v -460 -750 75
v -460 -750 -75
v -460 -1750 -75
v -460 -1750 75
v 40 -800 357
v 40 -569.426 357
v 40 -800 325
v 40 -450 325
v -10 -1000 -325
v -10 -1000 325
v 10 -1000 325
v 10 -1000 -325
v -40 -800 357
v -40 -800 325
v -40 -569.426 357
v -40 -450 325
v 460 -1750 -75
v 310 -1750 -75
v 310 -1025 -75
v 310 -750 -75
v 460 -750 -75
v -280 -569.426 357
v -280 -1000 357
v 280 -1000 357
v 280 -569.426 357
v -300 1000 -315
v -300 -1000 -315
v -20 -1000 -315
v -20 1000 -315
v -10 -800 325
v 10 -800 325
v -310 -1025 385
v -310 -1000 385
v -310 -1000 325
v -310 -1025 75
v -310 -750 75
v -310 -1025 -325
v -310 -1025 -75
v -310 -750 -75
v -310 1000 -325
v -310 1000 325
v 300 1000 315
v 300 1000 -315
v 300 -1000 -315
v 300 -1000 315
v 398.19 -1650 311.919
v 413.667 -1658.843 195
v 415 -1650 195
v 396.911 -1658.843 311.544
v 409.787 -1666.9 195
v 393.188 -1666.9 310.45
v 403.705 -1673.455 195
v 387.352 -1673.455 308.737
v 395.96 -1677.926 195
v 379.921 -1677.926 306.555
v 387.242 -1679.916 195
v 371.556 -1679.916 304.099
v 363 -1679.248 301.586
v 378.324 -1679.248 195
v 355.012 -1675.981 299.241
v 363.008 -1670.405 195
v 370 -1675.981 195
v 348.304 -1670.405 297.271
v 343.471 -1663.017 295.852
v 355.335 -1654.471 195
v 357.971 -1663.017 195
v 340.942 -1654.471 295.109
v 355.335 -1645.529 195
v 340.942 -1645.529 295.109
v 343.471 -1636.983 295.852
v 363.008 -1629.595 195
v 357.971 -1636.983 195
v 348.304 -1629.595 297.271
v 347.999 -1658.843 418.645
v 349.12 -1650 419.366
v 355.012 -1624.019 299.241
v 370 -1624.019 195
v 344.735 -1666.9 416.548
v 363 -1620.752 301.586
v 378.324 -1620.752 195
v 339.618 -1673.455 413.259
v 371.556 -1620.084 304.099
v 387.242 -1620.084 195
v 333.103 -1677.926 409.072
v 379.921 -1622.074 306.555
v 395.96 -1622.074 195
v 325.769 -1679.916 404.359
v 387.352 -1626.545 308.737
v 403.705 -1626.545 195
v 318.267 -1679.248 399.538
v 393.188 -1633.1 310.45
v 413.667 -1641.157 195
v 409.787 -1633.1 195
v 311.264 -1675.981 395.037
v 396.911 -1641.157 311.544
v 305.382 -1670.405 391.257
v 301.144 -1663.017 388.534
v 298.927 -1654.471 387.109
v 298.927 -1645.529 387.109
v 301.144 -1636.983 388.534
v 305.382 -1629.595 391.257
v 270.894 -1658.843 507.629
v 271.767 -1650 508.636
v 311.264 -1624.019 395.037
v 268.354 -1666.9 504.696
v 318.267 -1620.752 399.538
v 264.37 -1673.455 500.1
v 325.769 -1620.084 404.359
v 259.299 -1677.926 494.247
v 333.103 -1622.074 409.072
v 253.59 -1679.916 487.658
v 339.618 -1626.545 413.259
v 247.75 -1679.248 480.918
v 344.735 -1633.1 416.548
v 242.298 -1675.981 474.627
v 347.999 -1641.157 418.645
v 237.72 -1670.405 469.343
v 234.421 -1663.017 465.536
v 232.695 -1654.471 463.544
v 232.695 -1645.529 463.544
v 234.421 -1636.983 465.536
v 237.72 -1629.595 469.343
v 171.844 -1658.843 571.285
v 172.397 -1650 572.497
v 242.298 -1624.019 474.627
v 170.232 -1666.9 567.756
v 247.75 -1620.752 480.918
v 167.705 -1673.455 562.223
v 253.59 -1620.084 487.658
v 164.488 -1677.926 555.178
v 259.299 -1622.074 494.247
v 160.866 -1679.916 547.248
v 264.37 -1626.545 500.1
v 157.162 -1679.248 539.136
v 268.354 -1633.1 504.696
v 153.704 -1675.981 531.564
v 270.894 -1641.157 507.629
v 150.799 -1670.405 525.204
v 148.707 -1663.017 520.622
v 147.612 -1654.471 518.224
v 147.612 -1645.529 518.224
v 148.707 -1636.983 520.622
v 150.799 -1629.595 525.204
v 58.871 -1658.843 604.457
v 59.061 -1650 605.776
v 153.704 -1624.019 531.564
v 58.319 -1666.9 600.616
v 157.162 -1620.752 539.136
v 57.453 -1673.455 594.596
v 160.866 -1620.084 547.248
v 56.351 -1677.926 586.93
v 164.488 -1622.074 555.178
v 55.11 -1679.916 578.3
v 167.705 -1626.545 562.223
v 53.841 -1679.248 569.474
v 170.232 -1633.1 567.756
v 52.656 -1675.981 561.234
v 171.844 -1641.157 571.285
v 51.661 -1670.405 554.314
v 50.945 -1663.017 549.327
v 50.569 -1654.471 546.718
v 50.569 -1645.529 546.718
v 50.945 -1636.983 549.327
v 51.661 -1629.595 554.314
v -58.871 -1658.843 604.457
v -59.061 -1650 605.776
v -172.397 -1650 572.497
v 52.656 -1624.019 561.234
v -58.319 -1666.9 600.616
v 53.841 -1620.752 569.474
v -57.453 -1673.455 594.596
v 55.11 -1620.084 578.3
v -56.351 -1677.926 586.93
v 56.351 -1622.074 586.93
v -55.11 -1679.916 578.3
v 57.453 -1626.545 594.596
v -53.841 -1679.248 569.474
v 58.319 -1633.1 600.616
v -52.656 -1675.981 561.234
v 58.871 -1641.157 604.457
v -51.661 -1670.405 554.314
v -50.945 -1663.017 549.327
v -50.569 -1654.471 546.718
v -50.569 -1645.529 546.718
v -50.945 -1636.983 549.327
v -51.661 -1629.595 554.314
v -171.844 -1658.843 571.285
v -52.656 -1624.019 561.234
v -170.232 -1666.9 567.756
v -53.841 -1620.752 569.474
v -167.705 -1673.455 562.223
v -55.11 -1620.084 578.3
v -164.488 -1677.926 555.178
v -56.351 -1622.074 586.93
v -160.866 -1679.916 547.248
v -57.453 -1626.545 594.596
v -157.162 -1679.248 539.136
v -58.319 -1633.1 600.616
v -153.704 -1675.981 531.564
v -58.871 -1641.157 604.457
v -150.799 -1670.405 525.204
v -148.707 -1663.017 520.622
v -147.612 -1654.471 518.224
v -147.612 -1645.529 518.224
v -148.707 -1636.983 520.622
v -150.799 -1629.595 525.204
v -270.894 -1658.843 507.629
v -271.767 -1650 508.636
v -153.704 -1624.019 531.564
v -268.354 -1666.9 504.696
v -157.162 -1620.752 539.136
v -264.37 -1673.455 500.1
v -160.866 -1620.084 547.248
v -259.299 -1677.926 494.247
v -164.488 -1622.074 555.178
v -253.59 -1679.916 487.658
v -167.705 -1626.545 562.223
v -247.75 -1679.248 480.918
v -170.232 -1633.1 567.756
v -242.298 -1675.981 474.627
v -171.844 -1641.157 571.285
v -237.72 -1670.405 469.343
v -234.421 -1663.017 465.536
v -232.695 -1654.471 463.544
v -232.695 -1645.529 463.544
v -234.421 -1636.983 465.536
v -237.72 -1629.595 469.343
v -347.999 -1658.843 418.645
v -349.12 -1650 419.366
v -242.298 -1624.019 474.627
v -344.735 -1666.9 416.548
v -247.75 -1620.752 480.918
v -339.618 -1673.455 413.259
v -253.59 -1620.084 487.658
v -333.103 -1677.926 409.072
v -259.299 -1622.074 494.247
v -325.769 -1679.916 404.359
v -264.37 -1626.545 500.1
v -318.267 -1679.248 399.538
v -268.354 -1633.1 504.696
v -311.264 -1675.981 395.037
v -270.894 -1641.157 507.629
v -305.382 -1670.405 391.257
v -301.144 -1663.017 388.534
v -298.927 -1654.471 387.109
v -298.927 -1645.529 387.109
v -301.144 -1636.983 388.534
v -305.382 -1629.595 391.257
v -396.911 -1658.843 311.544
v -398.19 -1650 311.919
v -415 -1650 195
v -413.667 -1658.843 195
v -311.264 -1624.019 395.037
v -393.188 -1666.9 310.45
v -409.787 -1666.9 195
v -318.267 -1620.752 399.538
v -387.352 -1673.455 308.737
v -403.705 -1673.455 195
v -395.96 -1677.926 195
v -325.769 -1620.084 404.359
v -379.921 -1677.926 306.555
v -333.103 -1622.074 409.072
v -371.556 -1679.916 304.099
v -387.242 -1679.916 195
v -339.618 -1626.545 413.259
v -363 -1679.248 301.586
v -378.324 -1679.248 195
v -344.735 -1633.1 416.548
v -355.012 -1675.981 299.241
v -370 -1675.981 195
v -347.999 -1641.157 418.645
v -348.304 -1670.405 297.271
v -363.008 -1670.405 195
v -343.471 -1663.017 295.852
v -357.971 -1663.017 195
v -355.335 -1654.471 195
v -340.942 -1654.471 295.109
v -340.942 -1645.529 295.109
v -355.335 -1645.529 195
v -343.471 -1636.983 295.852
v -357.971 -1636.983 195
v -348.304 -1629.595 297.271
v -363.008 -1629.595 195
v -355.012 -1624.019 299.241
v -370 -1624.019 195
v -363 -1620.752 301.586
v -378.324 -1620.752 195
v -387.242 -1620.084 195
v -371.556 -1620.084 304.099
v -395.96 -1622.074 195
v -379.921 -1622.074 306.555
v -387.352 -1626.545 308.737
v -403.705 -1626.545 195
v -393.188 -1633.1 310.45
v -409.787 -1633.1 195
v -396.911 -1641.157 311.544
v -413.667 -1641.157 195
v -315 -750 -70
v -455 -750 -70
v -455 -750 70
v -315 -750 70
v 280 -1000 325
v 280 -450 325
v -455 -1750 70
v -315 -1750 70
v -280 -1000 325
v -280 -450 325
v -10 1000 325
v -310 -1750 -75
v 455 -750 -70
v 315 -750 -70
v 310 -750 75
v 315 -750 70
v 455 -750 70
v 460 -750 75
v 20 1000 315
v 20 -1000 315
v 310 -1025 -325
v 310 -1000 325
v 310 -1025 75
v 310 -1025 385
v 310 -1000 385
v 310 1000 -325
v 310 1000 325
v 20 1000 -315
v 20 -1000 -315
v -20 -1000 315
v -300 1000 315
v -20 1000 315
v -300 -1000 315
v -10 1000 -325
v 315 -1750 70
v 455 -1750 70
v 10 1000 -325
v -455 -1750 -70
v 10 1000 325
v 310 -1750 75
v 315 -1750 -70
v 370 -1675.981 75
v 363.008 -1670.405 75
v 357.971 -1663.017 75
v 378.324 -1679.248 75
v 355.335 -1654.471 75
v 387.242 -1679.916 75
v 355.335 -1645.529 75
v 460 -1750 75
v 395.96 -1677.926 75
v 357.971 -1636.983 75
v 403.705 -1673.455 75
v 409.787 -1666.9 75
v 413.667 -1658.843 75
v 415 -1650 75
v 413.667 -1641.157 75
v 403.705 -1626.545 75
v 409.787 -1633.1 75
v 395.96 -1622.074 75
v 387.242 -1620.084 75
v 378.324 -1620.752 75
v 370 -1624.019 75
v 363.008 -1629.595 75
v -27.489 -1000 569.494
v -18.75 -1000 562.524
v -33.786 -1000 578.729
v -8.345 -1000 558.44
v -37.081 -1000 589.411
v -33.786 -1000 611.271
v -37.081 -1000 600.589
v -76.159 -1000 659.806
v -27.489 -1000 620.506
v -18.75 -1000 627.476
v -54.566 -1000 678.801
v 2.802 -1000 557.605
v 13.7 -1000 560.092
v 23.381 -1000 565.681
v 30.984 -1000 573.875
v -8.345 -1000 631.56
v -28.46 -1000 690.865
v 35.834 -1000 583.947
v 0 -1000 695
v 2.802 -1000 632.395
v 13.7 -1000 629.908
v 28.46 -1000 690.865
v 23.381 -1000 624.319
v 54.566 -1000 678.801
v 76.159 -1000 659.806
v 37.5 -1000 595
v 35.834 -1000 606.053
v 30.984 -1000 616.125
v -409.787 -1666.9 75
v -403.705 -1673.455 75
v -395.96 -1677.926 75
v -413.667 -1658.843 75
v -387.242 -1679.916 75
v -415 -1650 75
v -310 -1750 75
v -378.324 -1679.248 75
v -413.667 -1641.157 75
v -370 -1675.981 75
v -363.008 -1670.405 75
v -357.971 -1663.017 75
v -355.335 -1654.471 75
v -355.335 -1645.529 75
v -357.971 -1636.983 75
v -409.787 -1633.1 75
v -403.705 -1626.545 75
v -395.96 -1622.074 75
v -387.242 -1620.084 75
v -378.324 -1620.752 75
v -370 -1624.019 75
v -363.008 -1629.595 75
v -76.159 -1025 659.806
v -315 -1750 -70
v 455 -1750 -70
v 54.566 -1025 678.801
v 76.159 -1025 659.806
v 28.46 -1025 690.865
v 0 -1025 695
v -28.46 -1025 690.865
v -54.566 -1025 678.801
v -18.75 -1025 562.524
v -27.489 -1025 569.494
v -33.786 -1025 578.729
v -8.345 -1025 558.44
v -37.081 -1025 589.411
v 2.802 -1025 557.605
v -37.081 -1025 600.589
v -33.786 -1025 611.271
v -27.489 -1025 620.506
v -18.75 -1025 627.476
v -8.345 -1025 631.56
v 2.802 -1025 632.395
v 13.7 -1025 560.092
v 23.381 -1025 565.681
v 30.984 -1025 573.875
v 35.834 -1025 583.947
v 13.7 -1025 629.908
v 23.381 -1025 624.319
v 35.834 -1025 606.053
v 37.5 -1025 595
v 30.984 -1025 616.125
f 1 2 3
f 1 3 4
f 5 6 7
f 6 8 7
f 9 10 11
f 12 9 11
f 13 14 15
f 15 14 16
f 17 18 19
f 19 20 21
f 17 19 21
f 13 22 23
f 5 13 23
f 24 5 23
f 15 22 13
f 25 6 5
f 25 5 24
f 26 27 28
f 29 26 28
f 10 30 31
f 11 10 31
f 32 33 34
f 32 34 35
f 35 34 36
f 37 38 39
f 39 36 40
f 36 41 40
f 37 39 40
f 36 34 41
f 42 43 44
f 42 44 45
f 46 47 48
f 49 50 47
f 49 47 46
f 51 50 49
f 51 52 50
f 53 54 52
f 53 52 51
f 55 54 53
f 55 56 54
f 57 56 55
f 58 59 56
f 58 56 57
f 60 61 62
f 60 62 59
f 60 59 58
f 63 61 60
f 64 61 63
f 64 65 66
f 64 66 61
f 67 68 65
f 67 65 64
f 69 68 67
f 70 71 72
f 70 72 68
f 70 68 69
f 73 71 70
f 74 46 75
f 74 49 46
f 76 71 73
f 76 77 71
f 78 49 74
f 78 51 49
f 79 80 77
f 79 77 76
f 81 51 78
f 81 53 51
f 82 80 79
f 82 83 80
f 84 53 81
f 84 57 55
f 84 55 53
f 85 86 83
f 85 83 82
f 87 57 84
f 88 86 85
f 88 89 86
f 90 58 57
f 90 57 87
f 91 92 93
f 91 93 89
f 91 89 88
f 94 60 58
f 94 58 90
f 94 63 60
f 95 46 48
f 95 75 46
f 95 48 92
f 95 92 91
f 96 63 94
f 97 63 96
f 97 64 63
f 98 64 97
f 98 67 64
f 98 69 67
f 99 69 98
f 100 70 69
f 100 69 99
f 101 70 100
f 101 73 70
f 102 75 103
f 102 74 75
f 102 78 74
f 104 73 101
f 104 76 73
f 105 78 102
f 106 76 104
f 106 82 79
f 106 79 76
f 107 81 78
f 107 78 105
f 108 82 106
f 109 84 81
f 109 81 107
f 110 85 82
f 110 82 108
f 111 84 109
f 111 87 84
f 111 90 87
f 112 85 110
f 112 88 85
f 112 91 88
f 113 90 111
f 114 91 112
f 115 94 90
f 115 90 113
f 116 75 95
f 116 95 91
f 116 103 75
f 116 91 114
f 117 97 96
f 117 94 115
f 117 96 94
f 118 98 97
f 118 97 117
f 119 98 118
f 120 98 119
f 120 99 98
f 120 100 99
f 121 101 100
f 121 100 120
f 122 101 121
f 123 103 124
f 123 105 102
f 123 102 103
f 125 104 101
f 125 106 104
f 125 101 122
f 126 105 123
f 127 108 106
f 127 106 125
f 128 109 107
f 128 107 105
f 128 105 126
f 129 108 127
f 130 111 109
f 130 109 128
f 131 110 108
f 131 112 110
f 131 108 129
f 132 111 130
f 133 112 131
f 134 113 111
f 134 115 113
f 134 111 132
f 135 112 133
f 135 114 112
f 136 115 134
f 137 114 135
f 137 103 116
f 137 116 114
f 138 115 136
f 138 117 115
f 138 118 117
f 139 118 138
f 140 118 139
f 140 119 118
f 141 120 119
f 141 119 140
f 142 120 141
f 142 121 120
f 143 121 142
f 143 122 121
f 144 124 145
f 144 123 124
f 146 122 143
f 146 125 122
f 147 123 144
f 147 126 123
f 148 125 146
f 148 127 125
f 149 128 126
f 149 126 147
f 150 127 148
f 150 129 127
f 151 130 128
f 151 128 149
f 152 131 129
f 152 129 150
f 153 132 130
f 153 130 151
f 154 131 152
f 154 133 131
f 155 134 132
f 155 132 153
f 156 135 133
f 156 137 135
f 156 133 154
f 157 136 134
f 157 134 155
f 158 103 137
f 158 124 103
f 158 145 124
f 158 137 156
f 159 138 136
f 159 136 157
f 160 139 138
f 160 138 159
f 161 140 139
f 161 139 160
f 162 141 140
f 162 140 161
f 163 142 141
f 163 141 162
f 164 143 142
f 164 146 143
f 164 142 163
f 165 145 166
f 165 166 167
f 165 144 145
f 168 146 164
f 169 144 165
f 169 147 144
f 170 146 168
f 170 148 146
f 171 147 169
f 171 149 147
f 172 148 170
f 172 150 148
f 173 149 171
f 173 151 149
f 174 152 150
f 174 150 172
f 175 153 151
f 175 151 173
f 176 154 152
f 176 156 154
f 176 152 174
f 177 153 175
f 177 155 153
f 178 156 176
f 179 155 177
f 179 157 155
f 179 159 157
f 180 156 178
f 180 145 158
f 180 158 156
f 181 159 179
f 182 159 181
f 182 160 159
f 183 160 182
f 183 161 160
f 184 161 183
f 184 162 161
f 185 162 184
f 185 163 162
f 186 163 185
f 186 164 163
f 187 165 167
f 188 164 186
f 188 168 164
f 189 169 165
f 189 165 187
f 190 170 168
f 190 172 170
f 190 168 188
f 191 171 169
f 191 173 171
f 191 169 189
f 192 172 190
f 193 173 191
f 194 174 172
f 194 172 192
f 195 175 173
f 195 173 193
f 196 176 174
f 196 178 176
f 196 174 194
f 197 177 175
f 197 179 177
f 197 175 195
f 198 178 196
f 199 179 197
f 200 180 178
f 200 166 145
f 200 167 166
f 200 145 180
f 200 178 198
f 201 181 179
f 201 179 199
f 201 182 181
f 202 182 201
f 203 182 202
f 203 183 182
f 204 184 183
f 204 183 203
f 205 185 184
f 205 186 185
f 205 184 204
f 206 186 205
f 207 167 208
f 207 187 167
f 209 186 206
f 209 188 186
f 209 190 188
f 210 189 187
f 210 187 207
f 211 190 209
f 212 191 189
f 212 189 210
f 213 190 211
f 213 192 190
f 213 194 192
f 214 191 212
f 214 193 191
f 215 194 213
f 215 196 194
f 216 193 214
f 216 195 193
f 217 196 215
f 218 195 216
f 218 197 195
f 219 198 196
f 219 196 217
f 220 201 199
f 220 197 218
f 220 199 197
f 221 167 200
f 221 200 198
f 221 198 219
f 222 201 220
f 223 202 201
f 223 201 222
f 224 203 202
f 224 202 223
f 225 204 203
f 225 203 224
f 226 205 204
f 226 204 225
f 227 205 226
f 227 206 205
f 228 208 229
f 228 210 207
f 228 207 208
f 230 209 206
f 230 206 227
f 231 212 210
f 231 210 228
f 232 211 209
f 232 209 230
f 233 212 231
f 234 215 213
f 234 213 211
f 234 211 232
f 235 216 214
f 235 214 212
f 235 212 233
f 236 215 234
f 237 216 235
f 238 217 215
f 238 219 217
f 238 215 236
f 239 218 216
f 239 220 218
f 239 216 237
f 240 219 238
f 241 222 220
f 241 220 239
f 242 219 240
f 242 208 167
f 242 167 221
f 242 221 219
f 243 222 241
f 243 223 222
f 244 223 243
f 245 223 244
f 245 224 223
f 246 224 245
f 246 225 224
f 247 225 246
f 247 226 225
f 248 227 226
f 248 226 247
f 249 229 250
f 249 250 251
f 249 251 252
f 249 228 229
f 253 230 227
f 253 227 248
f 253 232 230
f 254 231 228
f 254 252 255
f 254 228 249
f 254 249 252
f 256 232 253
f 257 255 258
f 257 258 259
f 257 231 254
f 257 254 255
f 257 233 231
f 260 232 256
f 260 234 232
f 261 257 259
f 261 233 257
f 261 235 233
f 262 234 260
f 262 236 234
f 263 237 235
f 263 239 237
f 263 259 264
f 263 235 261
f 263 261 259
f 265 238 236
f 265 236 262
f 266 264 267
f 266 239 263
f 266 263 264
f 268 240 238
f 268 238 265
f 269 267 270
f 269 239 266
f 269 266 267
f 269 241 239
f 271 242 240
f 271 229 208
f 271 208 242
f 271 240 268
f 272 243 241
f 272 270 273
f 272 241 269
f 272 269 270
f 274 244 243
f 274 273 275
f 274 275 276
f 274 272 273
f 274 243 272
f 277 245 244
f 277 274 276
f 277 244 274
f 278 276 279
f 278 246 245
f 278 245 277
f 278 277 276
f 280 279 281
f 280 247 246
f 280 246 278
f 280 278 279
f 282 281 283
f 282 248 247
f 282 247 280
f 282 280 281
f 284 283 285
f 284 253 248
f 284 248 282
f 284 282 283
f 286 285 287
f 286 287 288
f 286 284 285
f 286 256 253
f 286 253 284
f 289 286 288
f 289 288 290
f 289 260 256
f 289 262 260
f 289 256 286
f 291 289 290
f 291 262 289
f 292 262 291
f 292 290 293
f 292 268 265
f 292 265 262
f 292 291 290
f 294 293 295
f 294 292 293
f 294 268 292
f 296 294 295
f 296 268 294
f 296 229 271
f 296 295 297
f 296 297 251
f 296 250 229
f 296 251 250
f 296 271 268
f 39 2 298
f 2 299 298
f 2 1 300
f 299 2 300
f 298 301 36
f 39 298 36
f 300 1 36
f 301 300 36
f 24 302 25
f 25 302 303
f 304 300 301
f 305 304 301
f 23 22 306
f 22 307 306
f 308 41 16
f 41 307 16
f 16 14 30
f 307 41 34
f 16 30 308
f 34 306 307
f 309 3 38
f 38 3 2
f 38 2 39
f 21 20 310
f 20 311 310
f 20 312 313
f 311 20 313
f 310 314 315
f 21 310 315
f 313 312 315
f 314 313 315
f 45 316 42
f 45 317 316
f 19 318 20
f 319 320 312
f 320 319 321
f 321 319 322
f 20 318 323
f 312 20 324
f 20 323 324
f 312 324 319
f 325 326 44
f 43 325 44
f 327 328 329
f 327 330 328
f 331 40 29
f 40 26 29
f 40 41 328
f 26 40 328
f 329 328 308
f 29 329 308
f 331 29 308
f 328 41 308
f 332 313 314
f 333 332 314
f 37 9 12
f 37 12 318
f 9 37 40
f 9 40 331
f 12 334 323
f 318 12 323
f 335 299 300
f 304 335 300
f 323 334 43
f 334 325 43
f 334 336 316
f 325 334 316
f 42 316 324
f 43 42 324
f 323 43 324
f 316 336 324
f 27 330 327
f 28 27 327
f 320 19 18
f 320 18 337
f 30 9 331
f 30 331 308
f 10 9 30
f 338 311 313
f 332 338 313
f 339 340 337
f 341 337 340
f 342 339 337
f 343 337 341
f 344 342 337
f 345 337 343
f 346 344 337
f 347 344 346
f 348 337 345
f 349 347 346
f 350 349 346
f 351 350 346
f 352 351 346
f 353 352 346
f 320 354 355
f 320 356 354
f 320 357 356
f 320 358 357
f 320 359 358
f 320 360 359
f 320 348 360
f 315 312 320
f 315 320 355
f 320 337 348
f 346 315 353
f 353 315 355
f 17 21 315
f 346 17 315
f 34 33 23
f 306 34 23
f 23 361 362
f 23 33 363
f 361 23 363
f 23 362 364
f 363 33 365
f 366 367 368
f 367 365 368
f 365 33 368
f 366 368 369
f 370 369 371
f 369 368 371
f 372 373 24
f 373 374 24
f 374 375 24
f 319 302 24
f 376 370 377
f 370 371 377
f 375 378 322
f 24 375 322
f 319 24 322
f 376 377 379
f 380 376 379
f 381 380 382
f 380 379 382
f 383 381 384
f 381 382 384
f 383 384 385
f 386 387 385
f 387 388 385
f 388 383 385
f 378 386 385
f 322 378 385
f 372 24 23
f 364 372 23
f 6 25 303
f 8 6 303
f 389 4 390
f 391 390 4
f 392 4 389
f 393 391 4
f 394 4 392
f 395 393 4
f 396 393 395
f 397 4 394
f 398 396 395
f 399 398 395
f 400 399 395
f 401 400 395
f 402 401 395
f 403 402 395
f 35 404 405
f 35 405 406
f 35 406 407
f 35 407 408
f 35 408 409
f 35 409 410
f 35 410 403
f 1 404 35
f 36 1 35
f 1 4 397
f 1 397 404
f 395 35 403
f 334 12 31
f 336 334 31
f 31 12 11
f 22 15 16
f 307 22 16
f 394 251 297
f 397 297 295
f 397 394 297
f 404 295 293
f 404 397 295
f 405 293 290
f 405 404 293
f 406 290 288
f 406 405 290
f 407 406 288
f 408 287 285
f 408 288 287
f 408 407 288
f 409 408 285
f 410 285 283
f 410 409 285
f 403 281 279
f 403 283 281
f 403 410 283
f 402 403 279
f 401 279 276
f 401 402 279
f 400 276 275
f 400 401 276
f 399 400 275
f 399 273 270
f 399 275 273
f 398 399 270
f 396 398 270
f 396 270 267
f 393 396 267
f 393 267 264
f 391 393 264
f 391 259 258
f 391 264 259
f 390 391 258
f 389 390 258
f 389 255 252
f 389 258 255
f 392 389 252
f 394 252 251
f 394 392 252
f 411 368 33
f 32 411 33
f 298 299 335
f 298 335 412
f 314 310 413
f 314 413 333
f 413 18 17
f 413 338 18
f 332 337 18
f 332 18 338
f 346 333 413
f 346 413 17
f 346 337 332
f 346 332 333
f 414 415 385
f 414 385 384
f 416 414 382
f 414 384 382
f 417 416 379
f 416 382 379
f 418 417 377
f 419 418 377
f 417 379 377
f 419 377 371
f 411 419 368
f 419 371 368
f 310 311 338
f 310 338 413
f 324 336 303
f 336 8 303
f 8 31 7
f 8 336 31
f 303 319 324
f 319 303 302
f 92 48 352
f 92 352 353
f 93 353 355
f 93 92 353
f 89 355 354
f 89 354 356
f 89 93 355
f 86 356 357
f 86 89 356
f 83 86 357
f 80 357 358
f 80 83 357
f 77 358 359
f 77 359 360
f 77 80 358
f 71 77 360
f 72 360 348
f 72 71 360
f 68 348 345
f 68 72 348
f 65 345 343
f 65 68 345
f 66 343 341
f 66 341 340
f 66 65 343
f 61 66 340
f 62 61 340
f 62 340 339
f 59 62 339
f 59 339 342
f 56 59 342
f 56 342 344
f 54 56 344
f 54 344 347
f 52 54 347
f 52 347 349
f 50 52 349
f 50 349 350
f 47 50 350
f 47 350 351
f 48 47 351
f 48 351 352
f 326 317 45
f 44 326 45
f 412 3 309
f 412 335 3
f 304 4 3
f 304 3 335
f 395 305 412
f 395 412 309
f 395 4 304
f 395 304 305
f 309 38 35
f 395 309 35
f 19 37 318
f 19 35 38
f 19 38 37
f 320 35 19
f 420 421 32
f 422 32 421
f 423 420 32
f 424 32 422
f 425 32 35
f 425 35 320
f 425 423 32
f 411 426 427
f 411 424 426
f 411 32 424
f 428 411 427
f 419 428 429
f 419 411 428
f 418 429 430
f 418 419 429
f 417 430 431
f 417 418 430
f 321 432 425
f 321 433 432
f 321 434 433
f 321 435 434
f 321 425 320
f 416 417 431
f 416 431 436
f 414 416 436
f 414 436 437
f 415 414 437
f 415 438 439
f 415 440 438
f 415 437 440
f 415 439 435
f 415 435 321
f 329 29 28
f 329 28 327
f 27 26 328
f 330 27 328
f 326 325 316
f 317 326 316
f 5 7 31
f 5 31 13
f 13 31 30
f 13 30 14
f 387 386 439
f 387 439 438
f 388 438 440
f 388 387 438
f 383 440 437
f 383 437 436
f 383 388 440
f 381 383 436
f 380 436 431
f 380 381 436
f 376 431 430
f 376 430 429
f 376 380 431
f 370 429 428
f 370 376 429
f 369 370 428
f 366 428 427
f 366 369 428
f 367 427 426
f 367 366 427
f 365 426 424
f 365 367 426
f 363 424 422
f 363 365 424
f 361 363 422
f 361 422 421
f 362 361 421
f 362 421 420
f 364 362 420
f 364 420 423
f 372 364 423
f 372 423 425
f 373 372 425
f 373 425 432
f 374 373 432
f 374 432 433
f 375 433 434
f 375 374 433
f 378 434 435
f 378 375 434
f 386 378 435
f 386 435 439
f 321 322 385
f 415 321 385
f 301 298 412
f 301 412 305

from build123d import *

# Parameters (mm, degrees)
F0_W      = 300
F0_H      = 650
F0_W_2    = 280
F0_H_2    = 630
F1_DEPTH  = 1000
F3_DEPTH  = 32
F5_DEPTH  = 560
F6_R      = 37.5
F7_DEPTH  = 25
F10_W     = 150
F10_H     = 150
F10_W_2   = 140
F10_H_2   = 140
F11_DEPTH = 1000
F12_R     = 30


with BuildPart() as f1:
    # F0 (on Front) → F1 (new body, symmetric)
    with BuildSketch(Plane.XZ):
        with Locations((-160, 0)):
            Rectangle(F0_W, F0_H)
        with Locations((-160, 0)):
            Rectangle(F0_W_2, F0_H_2, mode=Mode.SUBTRACT)
    extrude(amount=F1_DEPTH, both=True)


with BuildPart() as f1b:
    # F0 (on Front) → F1, piece 2 (new body, symmetric)
    with BuildSketch(Plane.XZ):
        with Locations((160, 0)):
            Rectangle(F0_W, F0_H)
        with Locations((160, 0)):
            Rectangle(F0_W_2, F0_H_2, mode=Mode.SUBTRACT)
    extrude(amount=F1_DEPTH, both=True)


with BuildPart() as f3:
    # F2 (on face) → F3 (new body)
    with BuildSketch(Plane.XY.offset(325)):
        Polygon((-40, -450), (-280, -450), (-280, -1000), (280, -1000), (280, -450), (40, -450), (40, -800), (-40, -800), align=None)
    extrude(amount=F3_DEPTH)

    # F4 (on face) → F5 (cut, through all)
    with BuildSketch(Plane.YZ.offset(280)):
        Polygon((-569.4256258422, 357), (-450, 325), (-450, 357), align=None)
    extrude(amount=-F5_DEPTH, mode=Mode.SUBTRACT)


with BuildPart() as f7:
    # F6 (on face) → F7 (new body)
    with BuildSketch(Plane.XZ.offset(1000)):
        with BuildLine():
            Line((-310, -325), (310, -325))
            Line((310, -325), (310, 385))
            Line((310, 385), (76.1589143518, 659.8060164241))
            ThreePointArc((76.1589143518, 659.8060164241), (0, 695), (-76.1589143518, 659.8060164241))
            Line((-76.1589143518, 659.8060164241), (-310, 385))
            Line((-310, 385), (-310, -325))
        make_face()
        with Locations((0, 595)):
            Circle(F6_R, mode=Mode.SUBTRACT)
    extrude(amount=F7_DEPTH)


with BuildPart() as f1_1:
    add(f1.part)

    # F8: union F1b, F3, F7
    add(f1b.part)
    add(f3.part)
    add(f7.part)

    # F10 (on offset) → F11 (join)
    with BuildSketch(Plane.XZ.offset(750)):
        with Locations((385, 0)):
            Rectangle(F10_W, F10_H)
        with Locations((385, 0)):
            Rectangle(F10_W_2, F10_H_2, mode=Mode.SUBTRACT)
        with Locations((-385, 0)):
            Rectangle(F10_W, F10_H)
        with Locations((-385, 0)):
            Rectangle(F10_W_2, F10_H_2, mode=Mode.SUBTRACT)
    extrude(amount=F11_DEPTH)

    # F15: sweep along a path in F14
    with BuildLine(Plane.XZ.offset(1650)) as f15_path:
        Line((385, 75), (385, 195))
        ThreePointArc((385, 195), (0, 580), (-385, 195))
        Line((-385, 195), (-385, 75))
    # F12 (on face) → F15 (sweep)
    with BuildSketch(Plane.XY.offset(75)):
        with Locations((385, -1650)):
            Circle(F12_R)
    sweep(path=f15_path.line)


solid = f1_1.part
